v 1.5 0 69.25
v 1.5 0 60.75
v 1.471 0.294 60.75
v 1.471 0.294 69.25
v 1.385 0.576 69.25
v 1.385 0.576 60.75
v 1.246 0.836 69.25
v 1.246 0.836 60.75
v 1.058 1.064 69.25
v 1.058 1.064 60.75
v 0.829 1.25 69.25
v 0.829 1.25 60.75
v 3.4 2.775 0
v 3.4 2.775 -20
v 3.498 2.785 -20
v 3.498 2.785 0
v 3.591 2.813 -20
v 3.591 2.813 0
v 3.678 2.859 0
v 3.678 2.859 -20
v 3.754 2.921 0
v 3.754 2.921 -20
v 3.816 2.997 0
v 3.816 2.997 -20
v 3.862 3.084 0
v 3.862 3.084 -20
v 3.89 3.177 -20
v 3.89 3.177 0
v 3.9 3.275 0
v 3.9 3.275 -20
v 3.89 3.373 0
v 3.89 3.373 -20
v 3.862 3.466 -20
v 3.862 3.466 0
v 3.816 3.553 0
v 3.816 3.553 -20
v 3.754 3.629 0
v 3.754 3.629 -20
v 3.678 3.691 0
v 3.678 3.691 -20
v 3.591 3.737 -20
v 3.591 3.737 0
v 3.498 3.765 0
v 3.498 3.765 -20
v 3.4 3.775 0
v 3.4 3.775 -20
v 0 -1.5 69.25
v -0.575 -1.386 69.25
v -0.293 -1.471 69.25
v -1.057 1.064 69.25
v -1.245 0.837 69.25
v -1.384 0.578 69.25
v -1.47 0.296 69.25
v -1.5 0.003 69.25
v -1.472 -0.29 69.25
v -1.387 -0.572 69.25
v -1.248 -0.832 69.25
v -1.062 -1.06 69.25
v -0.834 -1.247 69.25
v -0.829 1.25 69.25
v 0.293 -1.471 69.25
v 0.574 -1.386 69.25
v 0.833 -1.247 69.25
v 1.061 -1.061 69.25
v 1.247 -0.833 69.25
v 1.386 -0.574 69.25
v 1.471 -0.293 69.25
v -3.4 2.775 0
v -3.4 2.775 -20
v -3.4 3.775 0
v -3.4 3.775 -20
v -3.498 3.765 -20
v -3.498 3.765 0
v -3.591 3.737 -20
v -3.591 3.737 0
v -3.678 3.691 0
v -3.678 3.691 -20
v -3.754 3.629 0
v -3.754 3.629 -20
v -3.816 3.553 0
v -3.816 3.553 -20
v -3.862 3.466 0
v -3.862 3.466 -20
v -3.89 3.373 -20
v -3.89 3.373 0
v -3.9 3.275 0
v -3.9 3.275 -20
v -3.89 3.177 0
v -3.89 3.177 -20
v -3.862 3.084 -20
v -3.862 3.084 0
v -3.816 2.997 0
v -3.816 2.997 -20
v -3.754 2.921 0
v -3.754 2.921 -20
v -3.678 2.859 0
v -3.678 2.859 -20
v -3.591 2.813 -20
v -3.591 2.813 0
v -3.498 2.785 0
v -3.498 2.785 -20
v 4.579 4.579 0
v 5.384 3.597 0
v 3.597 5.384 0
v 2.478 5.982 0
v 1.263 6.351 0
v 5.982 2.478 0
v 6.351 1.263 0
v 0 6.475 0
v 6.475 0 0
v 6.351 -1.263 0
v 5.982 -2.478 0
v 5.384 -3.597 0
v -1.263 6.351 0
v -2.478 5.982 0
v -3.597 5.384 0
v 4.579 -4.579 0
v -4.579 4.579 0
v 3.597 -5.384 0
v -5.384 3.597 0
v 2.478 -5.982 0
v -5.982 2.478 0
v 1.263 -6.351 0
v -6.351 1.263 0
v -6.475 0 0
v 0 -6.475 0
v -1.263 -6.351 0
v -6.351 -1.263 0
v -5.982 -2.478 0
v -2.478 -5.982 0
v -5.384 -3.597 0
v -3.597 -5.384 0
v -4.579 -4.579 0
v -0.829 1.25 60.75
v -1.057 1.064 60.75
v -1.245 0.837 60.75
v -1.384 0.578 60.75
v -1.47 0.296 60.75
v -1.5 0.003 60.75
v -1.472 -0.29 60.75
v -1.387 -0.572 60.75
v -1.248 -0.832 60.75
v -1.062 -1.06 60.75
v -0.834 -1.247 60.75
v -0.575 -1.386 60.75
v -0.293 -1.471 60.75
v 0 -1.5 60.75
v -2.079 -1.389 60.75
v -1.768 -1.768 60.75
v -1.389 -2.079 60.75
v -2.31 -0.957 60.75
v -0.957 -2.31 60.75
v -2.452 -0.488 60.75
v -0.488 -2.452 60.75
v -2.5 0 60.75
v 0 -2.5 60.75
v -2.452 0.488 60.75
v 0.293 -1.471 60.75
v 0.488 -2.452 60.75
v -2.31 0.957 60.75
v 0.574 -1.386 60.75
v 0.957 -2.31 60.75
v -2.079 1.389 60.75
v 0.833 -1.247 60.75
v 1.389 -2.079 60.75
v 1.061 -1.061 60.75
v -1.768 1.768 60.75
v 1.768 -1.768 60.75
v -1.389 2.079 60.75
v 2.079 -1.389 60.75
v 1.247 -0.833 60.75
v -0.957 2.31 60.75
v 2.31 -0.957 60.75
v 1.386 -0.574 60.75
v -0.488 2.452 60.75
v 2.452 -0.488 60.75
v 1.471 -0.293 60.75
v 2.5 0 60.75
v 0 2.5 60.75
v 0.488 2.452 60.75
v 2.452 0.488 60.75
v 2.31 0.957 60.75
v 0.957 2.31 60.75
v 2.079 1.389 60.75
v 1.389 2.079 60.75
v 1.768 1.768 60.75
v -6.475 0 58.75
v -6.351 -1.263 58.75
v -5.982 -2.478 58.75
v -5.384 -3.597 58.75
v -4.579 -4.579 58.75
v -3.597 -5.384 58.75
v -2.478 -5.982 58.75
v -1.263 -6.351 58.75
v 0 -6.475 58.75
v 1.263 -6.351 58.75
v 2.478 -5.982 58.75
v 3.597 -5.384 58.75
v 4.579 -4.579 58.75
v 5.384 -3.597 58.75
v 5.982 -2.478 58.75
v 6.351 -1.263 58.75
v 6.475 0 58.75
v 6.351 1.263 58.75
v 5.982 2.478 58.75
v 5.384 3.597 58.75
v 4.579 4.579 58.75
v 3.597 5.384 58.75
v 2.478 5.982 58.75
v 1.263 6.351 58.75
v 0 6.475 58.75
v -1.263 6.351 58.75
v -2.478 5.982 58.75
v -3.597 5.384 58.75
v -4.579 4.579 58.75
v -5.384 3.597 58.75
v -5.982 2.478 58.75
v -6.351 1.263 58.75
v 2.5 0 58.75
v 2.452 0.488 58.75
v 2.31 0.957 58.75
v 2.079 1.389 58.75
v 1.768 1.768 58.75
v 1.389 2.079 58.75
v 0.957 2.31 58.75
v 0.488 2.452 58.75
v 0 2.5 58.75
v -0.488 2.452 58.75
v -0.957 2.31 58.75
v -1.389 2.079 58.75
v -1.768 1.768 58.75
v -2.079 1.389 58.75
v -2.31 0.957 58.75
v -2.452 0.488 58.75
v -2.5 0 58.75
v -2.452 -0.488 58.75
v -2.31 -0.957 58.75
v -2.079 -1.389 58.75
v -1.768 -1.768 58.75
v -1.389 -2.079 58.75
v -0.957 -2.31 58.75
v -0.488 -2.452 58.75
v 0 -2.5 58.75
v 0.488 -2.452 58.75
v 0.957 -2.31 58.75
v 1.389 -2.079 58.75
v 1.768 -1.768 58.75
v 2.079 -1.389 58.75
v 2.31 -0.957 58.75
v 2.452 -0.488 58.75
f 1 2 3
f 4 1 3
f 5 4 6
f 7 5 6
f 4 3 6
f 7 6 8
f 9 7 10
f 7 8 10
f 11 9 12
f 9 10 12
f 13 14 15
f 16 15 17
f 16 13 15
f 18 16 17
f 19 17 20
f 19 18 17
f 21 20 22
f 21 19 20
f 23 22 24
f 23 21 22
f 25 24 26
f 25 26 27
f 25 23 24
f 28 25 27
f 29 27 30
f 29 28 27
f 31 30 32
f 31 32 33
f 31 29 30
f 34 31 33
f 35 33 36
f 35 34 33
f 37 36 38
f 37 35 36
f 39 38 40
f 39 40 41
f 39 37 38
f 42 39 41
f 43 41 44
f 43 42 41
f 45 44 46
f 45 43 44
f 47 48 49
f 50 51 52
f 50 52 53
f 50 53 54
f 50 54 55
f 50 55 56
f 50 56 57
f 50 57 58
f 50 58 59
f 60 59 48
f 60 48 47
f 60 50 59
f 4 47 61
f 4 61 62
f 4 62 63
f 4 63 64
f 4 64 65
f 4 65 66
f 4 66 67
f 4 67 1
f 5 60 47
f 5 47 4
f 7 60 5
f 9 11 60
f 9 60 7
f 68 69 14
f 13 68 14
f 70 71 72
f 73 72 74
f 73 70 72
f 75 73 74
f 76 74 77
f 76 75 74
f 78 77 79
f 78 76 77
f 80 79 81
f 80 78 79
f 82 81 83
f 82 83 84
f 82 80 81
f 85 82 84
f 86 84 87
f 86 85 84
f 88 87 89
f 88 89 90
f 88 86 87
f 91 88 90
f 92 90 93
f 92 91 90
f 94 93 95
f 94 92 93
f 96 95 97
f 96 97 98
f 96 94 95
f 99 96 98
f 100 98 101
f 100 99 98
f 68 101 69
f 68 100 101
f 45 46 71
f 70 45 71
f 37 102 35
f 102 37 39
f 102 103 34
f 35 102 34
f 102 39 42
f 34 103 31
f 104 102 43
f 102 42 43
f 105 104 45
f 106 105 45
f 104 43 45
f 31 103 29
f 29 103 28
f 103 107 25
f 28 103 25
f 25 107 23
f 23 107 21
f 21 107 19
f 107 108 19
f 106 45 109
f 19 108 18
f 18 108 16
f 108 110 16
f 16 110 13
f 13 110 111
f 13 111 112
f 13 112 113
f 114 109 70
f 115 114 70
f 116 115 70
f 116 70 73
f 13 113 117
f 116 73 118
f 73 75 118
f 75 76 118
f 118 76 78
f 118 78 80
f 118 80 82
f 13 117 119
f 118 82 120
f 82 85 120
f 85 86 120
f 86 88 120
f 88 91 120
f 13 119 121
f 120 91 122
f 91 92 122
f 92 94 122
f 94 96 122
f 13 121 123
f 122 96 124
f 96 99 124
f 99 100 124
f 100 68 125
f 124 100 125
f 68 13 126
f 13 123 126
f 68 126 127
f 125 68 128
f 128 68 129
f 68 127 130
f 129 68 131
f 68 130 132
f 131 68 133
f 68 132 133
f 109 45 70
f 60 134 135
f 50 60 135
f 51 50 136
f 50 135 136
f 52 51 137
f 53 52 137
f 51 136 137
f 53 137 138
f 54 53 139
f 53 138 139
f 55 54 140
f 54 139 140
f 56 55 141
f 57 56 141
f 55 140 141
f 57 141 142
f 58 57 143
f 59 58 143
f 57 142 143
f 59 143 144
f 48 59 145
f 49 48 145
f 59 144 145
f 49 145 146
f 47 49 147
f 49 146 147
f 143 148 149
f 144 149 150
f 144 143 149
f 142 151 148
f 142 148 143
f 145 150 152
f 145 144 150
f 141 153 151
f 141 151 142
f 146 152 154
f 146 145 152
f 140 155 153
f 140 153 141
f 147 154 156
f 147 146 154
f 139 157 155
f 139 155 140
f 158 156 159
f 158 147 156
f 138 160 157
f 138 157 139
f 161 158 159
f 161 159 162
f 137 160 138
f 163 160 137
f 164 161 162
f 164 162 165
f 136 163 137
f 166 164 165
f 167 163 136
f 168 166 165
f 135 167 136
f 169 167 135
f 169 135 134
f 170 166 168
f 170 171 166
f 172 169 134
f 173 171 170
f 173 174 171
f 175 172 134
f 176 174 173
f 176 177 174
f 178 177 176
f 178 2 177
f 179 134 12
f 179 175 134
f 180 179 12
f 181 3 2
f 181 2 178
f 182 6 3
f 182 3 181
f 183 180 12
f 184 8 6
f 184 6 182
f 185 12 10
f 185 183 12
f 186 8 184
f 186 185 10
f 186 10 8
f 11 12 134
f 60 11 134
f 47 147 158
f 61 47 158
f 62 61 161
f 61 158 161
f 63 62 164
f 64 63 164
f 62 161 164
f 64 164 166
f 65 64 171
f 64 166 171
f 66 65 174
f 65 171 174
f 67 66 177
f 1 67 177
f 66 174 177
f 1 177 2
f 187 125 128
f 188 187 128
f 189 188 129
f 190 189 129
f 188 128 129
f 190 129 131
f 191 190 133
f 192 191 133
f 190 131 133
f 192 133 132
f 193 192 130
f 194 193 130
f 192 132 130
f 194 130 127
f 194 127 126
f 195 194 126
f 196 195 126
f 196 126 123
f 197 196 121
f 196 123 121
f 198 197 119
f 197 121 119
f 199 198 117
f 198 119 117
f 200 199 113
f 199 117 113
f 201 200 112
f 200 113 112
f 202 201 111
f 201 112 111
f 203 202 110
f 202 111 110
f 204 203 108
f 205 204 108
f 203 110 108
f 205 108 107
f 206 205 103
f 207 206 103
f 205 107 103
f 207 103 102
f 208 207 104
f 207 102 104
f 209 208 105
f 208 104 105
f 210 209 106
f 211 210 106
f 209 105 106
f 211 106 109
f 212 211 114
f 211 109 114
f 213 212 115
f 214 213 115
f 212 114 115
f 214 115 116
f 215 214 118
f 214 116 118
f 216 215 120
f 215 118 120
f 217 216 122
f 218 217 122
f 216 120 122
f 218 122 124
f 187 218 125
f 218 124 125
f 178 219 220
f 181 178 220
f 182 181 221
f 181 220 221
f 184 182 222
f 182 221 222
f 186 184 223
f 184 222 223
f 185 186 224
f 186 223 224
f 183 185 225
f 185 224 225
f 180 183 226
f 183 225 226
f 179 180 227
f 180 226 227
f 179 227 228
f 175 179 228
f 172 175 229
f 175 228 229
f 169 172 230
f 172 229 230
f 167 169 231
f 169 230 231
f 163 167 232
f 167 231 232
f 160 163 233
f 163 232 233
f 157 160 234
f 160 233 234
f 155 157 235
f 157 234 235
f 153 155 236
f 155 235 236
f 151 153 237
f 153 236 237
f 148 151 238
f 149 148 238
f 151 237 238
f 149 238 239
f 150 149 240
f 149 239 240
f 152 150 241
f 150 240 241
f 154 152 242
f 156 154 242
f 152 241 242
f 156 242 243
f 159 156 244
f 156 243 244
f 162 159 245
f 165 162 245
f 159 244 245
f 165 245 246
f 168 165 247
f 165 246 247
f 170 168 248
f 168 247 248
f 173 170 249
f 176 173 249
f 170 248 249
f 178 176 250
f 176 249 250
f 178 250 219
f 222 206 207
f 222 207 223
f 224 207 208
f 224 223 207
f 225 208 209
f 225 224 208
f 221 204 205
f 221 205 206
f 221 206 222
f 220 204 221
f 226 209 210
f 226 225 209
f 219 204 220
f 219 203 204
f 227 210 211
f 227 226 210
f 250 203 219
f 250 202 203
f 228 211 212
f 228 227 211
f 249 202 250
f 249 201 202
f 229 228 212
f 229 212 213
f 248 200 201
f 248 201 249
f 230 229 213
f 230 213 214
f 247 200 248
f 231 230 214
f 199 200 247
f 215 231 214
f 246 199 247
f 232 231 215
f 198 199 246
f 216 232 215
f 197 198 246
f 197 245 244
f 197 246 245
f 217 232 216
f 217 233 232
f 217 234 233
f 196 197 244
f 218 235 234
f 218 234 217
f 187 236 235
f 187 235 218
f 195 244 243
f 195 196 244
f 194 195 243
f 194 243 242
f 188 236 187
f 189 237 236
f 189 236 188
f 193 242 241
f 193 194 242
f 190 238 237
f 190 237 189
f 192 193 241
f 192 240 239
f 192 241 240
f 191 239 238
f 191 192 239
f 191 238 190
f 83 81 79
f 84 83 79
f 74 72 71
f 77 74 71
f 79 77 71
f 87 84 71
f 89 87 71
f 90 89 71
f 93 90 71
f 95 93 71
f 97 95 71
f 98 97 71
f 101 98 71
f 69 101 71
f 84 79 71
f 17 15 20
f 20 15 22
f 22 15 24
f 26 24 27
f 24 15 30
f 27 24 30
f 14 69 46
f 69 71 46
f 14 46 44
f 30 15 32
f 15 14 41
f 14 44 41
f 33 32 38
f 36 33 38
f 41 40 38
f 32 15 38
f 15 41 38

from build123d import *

# Parameters (mm, degrees)
SKETCH1_R           = 6.475
BOSS_EXTRUDE1_DEPTH = 58.75
SKETCH2_R           = 2.5
BOSS_EXTRUDE2_DEPTH = 2
BOSS_EXTRUDE3_DEPTH = 8.5
BOSS_EXTRUDE4_DEPTH = 20


with BuildPart() as part:
    # Sketch1 → Boss-Extrude1 (new body)
    with BuildSketch(Plane.XY):
        with Locations(Location((0, 0, 0), (0, 0, 180))):
            Circle(SKETCH1_R)
    extrude(amount=BOSS_EXTRUDE1_DEPTH)

    # Sketch2 → Boss-Extrude2 (add)
    with BuildSketch(Plane.XY.offset(58.75)):
        Circle(SKETCH2_R)
    extrude(amount=BOSS_EXTRUDE2_DEPTH)

    # Sketch3 → Boss-Extrude3 (add)
    with BuildSketch(Plane.XY.offset(60.75)):
        with BuildLine():
            Line((0, 1.25), (-0.829156198, 1.25))
            ThreePointArc((-0.829156198, 1.25), (-1.436140662, -0.433012702), (0, -1.5))
            Line((0, -1.5), (0, 1.25))
        make_face()
        with BuildLine():
            Line((0.829156198, 1.25), (0, 1.25))
            Line((0, 1.25), (0, -1.5))
            ThreePointArc((0, -1.5), (1.060660172, -1.060660172), (1.5, 0))
            ThreePointArc((1.5, 0), (1.321691018, 0.709318583), (0.829156198, 1.25))
        make_face()
    extrude(amount=BOSS_EXTRUDE3_DEPTH)

    # Sketch4 → Boss-Extrude4 (add)
    with BuildSketch(Plane(origin=(0, 0, 0), x_dir=(-1, 0, 0), z_dir=(0, 0, -1))):
        with BuildLine():
            Line((-3.4, 3.775), (3.4, 3.775))
            ThreePointArc((3.4, 3.775), (3.9, 3.275), (3.4, 2.775))
            Line((3.4, 2.775), (-3.4, 2.775))
            ThreePointArc((-3.4, 2.775), (-3.9, 3.275), (-3.4, 3.775))
        make_face()
    extrude(amount=BOSS_EXTRUDE4_DEPTH)


solid = part.part
